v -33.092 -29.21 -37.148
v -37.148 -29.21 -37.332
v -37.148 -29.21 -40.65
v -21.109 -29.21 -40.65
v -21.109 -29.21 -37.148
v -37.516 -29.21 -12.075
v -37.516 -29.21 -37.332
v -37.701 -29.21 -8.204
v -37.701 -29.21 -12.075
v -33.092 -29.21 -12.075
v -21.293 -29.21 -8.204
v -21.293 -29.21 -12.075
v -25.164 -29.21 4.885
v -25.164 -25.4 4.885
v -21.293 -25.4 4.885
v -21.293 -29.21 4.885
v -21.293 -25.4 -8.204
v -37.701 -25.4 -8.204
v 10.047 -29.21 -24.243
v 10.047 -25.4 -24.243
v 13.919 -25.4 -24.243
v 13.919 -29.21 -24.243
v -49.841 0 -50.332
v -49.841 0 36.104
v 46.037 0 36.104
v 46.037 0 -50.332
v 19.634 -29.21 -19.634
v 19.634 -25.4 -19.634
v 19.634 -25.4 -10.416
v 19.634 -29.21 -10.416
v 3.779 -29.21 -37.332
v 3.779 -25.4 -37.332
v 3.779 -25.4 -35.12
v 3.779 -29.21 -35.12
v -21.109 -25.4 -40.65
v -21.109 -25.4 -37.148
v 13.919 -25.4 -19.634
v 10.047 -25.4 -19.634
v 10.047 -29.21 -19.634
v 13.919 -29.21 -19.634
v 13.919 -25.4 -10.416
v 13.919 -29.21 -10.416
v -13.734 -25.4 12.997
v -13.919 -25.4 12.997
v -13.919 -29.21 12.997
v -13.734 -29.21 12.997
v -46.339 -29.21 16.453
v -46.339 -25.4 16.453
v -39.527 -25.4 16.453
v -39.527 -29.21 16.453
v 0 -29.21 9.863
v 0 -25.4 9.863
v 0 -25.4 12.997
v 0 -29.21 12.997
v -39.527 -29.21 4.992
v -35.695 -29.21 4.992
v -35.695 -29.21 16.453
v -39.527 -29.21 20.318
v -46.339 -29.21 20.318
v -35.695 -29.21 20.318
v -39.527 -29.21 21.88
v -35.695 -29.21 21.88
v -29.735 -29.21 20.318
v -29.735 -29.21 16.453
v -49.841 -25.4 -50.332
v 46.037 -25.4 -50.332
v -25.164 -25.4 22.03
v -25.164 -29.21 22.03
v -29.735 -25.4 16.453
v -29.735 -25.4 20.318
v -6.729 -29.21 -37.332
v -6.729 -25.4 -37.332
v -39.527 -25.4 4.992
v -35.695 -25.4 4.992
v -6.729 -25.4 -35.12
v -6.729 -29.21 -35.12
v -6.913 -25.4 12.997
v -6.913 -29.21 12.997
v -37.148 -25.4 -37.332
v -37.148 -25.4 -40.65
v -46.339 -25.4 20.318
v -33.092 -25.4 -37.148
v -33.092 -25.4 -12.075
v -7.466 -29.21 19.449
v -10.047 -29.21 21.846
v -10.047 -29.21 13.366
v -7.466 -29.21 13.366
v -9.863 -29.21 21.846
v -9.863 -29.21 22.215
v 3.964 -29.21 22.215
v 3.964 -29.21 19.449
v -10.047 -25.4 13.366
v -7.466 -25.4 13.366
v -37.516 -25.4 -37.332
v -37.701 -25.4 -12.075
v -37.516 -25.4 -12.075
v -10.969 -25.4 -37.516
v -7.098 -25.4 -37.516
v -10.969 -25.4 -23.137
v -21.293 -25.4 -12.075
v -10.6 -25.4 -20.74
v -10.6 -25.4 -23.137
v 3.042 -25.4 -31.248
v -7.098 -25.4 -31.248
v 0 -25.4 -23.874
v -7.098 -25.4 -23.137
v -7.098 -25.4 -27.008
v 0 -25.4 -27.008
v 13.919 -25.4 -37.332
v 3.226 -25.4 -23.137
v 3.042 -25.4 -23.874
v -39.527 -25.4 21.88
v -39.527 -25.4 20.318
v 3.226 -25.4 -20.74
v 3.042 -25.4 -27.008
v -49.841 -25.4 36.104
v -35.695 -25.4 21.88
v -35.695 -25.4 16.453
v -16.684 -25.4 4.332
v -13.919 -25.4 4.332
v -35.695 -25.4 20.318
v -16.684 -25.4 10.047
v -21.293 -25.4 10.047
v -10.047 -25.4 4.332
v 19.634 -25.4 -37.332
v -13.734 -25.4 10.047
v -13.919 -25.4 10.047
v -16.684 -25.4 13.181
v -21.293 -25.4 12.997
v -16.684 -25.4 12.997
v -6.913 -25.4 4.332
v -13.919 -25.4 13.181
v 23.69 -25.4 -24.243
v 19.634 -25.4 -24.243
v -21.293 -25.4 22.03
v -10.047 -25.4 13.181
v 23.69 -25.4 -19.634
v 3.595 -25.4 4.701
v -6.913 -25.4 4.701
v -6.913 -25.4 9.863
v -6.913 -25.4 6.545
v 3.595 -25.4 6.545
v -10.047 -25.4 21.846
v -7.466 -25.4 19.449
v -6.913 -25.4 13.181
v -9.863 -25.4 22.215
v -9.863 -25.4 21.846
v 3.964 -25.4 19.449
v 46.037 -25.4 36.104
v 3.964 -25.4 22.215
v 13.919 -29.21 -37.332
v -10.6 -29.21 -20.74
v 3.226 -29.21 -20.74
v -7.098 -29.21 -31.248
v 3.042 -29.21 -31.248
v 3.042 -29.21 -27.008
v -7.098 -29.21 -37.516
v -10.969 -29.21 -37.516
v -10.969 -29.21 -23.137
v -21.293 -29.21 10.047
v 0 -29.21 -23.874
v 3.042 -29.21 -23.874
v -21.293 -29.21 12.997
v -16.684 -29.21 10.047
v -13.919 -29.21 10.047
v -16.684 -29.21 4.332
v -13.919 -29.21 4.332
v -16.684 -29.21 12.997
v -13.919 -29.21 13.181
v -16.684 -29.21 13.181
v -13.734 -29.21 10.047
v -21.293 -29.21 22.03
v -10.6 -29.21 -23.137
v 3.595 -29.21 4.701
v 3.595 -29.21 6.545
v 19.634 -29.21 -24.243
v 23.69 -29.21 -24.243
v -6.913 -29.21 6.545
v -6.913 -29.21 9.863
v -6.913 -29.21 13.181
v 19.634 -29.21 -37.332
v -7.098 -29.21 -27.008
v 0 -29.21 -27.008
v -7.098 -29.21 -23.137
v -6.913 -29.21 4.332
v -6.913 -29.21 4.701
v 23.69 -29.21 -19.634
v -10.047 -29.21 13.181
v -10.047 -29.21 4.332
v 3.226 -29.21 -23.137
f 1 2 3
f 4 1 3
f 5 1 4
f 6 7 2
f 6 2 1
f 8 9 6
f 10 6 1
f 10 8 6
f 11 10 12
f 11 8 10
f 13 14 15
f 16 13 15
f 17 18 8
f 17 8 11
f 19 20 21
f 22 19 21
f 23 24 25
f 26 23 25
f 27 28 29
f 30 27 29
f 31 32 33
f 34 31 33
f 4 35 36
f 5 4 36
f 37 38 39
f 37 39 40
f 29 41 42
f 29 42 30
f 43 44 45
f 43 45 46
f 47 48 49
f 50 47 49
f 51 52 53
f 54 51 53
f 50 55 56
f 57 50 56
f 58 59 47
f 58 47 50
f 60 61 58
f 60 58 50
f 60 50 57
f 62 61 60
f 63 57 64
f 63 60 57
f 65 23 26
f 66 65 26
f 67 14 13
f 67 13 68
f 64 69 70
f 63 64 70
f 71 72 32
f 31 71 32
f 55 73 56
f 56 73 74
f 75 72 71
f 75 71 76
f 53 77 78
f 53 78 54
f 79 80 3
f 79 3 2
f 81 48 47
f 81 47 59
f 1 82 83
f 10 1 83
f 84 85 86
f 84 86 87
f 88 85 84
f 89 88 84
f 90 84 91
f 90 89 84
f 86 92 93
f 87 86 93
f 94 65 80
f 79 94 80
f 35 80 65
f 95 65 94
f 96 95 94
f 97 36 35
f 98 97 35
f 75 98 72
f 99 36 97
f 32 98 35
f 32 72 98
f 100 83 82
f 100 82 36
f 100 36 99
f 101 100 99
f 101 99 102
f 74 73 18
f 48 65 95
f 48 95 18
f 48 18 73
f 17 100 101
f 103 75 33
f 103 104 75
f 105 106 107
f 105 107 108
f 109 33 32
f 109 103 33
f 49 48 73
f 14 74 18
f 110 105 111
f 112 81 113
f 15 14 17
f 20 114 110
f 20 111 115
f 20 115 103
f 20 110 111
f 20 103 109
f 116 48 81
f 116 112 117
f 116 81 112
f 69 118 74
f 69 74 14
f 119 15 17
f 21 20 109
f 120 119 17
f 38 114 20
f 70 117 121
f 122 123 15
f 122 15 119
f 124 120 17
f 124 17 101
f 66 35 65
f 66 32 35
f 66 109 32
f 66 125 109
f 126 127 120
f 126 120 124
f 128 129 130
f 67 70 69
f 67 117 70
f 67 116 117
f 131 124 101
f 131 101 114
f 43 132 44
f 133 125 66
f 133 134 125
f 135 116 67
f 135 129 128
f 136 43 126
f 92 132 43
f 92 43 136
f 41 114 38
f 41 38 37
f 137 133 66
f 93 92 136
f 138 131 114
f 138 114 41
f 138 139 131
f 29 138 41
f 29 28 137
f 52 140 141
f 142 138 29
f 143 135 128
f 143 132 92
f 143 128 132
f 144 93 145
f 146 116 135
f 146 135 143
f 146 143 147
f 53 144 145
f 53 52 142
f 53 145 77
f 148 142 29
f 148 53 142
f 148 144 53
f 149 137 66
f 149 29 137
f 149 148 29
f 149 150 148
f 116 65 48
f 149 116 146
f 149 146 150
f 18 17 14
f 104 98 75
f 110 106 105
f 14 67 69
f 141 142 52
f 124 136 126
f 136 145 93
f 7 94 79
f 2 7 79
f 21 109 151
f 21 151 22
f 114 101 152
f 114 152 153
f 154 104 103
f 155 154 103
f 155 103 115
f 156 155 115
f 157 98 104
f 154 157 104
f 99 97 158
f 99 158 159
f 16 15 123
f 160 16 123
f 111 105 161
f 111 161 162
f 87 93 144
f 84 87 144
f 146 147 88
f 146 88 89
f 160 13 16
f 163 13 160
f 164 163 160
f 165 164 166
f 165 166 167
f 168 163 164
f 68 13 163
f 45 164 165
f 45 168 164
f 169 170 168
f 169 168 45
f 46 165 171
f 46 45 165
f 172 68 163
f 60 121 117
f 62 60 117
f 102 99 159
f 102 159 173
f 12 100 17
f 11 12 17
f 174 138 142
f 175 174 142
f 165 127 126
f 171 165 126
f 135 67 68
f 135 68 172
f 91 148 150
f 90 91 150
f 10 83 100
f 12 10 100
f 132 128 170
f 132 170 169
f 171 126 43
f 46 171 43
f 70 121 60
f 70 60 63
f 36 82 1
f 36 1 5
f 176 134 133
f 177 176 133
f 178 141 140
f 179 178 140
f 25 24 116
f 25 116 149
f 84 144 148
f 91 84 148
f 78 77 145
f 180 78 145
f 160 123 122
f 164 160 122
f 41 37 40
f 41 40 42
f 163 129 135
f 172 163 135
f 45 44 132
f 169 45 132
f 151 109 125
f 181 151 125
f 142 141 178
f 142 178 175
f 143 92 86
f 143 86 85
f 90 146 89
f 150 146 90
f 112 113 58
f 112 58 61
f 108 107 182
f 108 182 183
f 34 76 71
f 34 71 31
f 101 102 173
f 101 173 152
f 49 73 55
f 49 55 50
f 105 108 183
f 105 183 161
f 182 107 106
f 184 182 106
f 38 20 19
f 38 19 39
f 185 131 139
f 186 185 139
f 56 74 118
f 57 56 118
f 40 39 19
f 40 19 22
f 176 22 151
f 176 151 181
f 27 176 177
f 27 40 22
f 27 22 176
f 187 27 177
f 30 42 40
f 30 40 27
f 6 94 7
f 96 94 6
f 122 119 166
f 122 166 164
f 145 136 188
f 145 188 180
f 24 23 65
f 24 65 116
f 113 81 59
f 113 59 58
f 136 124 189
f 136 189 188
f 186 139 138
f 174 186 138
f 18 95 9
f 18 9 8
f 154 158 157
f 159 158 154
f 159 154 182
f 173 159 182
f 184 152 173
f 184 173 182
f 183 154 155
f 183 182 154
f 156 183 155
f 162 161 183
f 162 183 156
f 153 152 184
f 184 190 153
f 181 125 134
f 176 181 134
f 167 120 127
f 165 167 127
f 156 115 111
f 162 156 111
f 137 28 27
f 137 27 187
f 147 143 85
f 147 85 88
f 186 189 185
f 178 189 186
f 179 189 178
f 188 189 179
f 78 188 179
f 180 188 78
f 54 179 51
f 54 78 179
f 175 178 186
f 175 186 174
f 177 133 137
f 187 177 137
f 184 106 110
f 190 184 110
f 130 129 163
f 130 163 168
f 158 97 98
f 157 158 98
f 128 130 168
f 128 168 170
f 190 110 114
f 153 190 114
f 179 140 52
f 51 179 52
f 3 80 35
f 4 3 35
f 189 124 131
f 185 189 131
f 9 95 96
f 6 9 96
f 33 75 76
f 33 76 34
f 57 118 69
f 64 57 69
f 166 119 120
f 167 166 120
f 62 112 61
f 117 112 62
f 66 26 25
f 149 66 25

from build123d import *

# Parameters (mm, degrees)
F0_W      = 95.87875
F0_H      = 86.435549
F1_DEPTH  = 25.4
F2_W      = 3.831741
F2_H      = 16.888321
F22_DEPTH = 3.81
F4_W      = 3.871451
F4_H      = 17.145001
F23_DEPTH = 3.81
F6_W      = 2.765321
F6_H      = 8.849032
F24_DEPTH = 3.81
F3_W      = 16.604224
F3_H      = 3.865305
F25_DEPTH = 3.81
F5_W      = 11.43
F5_H      = 2.949677
F26_DEPTH = 3.81
F7_W      = 10.047339
F7_H      = 3.134032
F27_DEPTH = 3.81
F21_W     = 13.642261
F21_H     = 4.60887
F28_DEPTH = 3.81
F20_W     = 5.715003
F20_H     = 26.915808
F29_DEPTH = 3.81
F19_W     = 10.508227
F19_H     = 2.21226
F30_DEPTH = 3.81
F18_W     = 10.139517
F18_H     = 4.240159
F31_DEPTH = 3.81
F17_W     = 3.041856
F17_H     = 3.50274
F32_DEPTH = 3.81
F16_W     = 13.826613
F16_H     = 2.396613
F33_DEPTH = 3.81
F15_W     = 3.871451
F15_H     = 14.379678
F34_DEPTH = 3.81
F14_W     = 16.038871
F14_H     = 3.502741
F35_DEPTH = 3.81
F8_W      = 3.134032
F8_H      = 8.849032
F36_DEPTH = 3.81
F9_W      = 13.457904
F9_H      = 1.843549
F37_DEPTH = 3.81
F10_W     = 2.580968
F10_H     = 8.480324
F38_DEPTH = 3.81
F11_W     = 13.826613
F11_H     = 2.765322
F39_DEPTH = 3.81
F12_W     = 4.424516
F12_H     = 29.128066
F40_DEPTH = 3.81
F13_W     = 16.40758
F13_H     = 3.871451
F41_DEPTH = 3.81


with BuildPart() as f1:
    # F0 (on Front) → F1 (new body)
    with BuildSketch(Plane.XZ):
        with Locations((-1.902111, -7.113785)):
            Rectangle(F0_W, F0_H)
    extrude(amount=F1_DEPTH)

    # F2 (on face) → F22 (join)
    with BuildSketch(Plane.XZ.offset(25.4)):
        with Locations((-37.61089, 13.43617)):
            Rectangle(F2_W, F2_H)
    extrude(amount=F22_DEPTH)

    # F4 (on face) → F23 (join)
    with BuildSketch(Plane.XZ.offset(25.4)):
        with Locations((-23.22871, 13.457904)):
            Rectangle(F4_W, F4_H)
    extrude(amount=F23_DEPTH)

    # F6 (on face) → F24 (join)
    with BuildSketch(Plane.XZ.offset(25.4)):
        with Locations((-15.301452, 8.756855)):
            Rectangle(F6_W, F6_H)
    extrude(amount=F24_DEPTH)

    # F3 (on face) → F25 (join)
    with BuildSketch(Plane.XZ.offset(25.4)):
        with Locations((-38.03664, 18.385231)):
            Rectangle(F3_W, F3_H)
    extrude(amount=F25_DEPTH)

    # F5 (on face) → F26 (join)
    with BuildSketch(Plane.XZ.offset(25.4)):
        with Locations((-19.449435, 11.522177)):
            Rectangle(F5_W, F5_H)
    extrude(amount=F26_DEPTH)

    # F7 (on face) → F27 (join)
    with BuildSketch(Plane.XZ.offset(25.4)):
        with Locations((-5.023669, 11.43)):
            Rectangle(F7_W, F7_H)
    extrude(amount=F27_DEPTH)

    # F21 (on face) → F28 (join)
    with BuildSketch(Plane.XZ.offset(25.4)):
        with Locations((16.868469, -21.938225)):
            Rectangle(F21_W, F21_H)
    extrude(amount=F28_DEPTH)

    # F20 (on face) → F29 (join)
    with BuildSketch(Plane.XZ.offset(25.4)):
        with Locations((16.77629, -23.873953)):
            Rectangle(F20_W, F20_H)
    extrude(amount=F29_DEPTH)

    # F19 (on face) → F30 (join)
    with BuildSketch(Plane.XZ.offset(25.4)):
        with Locations((-1.474838, -36.225727)):
            Rectangle(F19_W, F19_H)
    extrude(amount=F30_DEPTH)

    # F18 (on face) → F31 (join)
    with BuildSketch(Plane.XZ.offset(25.4)):
        with Locations((-2.027902, -29.128065)):
            Rectangle(F18_W, F18_H)
    extrude(amount=F31_DEPTH)

    # F17 (on face) → F32 (join)
    with BuildSketch(Plane.XZ.offset(25.4)):
        with Locations((1.520928, -25.625323)):
            Rectangle(F17_W, F17_H)
    extrude(amount=F32_DEPTH)

    # F16 (on face) → F33 (join)
    with BuildSketch(Plane.XZ.offset(25.4)):
        with Locations((-3.687095, -21.938226)):
            Rectangle(F16_W, F16_H)
    extrude(amount=F33_DEPTH)

    # F15 (on face) → F34 (join)
    with BuildSketch(Plane.XZ.offset(25.4)):
        with Locations((-9.033386, -30.326371)):
            Rectangle(F15_W, F15_H)
    extrude(amount=F34_DEPTH)

    # F14 (on face) → F35 (join)
    with BuildSketch(Plane.XZ.offset(25.4)):
        with Locations((-29.128065, -38.898871)):
            Rectangle(F14_W, F14_H)
    extrude(amount=F35_DEPTH)

    # F8 (on face) → F36 (join)
    with BuildSketch(Plane.XZ.offset(25.4)):
        with Locations((-8.480323, 8.756855)):
            Rectangle(F8_W, F8_H)
    extrude(amount=F36_DEPTH)

    # F9 (on face) → F37 (join)
    with BuildSketch(Plane.XZ.offset(25.4)):
        with Locations((-3.134032, 5.622822)):
            Rectangle(F9_W, F9_H)
    extrude(amount=F37_DEPTH)

    # F10 (on face) → F38 (join)
    with BuildSketch(Plane.XZ.offset(25.4)):
        with Locations((-8.756855, 17.605888)):
            Rectangle(F10_W, F10_H)
    extrude(amount=F38_DEPTH)

    # F11 (on face) → F39 (join)
    with BuildSketch(Plane.XZ.offset(25.4)):
        with Locations((-2.949677, 20.832096)):
            Rectangle(F11_W, F11_H)
    extrude(amount=F39_DEPTH)

    # F12 (on face) → F40 (join)
    with BuildSketch(Plane.XZ.offset(25.4)):
        with Locations((-35.303952, -22.767824)):
            Rectangle(F12_W, F12_H)
    extrude(amount=F40_DEPTH)

    # F13 (on face) → F41 (join)
    with BuildSketch(Plane.XZ.offset(25.4)):
        with Locations((-29.496774, -10.139516)):
            Rectangle(F13_W, F13_H)
    extrude(amount=F41_DEPTH)


solid = f1.part
